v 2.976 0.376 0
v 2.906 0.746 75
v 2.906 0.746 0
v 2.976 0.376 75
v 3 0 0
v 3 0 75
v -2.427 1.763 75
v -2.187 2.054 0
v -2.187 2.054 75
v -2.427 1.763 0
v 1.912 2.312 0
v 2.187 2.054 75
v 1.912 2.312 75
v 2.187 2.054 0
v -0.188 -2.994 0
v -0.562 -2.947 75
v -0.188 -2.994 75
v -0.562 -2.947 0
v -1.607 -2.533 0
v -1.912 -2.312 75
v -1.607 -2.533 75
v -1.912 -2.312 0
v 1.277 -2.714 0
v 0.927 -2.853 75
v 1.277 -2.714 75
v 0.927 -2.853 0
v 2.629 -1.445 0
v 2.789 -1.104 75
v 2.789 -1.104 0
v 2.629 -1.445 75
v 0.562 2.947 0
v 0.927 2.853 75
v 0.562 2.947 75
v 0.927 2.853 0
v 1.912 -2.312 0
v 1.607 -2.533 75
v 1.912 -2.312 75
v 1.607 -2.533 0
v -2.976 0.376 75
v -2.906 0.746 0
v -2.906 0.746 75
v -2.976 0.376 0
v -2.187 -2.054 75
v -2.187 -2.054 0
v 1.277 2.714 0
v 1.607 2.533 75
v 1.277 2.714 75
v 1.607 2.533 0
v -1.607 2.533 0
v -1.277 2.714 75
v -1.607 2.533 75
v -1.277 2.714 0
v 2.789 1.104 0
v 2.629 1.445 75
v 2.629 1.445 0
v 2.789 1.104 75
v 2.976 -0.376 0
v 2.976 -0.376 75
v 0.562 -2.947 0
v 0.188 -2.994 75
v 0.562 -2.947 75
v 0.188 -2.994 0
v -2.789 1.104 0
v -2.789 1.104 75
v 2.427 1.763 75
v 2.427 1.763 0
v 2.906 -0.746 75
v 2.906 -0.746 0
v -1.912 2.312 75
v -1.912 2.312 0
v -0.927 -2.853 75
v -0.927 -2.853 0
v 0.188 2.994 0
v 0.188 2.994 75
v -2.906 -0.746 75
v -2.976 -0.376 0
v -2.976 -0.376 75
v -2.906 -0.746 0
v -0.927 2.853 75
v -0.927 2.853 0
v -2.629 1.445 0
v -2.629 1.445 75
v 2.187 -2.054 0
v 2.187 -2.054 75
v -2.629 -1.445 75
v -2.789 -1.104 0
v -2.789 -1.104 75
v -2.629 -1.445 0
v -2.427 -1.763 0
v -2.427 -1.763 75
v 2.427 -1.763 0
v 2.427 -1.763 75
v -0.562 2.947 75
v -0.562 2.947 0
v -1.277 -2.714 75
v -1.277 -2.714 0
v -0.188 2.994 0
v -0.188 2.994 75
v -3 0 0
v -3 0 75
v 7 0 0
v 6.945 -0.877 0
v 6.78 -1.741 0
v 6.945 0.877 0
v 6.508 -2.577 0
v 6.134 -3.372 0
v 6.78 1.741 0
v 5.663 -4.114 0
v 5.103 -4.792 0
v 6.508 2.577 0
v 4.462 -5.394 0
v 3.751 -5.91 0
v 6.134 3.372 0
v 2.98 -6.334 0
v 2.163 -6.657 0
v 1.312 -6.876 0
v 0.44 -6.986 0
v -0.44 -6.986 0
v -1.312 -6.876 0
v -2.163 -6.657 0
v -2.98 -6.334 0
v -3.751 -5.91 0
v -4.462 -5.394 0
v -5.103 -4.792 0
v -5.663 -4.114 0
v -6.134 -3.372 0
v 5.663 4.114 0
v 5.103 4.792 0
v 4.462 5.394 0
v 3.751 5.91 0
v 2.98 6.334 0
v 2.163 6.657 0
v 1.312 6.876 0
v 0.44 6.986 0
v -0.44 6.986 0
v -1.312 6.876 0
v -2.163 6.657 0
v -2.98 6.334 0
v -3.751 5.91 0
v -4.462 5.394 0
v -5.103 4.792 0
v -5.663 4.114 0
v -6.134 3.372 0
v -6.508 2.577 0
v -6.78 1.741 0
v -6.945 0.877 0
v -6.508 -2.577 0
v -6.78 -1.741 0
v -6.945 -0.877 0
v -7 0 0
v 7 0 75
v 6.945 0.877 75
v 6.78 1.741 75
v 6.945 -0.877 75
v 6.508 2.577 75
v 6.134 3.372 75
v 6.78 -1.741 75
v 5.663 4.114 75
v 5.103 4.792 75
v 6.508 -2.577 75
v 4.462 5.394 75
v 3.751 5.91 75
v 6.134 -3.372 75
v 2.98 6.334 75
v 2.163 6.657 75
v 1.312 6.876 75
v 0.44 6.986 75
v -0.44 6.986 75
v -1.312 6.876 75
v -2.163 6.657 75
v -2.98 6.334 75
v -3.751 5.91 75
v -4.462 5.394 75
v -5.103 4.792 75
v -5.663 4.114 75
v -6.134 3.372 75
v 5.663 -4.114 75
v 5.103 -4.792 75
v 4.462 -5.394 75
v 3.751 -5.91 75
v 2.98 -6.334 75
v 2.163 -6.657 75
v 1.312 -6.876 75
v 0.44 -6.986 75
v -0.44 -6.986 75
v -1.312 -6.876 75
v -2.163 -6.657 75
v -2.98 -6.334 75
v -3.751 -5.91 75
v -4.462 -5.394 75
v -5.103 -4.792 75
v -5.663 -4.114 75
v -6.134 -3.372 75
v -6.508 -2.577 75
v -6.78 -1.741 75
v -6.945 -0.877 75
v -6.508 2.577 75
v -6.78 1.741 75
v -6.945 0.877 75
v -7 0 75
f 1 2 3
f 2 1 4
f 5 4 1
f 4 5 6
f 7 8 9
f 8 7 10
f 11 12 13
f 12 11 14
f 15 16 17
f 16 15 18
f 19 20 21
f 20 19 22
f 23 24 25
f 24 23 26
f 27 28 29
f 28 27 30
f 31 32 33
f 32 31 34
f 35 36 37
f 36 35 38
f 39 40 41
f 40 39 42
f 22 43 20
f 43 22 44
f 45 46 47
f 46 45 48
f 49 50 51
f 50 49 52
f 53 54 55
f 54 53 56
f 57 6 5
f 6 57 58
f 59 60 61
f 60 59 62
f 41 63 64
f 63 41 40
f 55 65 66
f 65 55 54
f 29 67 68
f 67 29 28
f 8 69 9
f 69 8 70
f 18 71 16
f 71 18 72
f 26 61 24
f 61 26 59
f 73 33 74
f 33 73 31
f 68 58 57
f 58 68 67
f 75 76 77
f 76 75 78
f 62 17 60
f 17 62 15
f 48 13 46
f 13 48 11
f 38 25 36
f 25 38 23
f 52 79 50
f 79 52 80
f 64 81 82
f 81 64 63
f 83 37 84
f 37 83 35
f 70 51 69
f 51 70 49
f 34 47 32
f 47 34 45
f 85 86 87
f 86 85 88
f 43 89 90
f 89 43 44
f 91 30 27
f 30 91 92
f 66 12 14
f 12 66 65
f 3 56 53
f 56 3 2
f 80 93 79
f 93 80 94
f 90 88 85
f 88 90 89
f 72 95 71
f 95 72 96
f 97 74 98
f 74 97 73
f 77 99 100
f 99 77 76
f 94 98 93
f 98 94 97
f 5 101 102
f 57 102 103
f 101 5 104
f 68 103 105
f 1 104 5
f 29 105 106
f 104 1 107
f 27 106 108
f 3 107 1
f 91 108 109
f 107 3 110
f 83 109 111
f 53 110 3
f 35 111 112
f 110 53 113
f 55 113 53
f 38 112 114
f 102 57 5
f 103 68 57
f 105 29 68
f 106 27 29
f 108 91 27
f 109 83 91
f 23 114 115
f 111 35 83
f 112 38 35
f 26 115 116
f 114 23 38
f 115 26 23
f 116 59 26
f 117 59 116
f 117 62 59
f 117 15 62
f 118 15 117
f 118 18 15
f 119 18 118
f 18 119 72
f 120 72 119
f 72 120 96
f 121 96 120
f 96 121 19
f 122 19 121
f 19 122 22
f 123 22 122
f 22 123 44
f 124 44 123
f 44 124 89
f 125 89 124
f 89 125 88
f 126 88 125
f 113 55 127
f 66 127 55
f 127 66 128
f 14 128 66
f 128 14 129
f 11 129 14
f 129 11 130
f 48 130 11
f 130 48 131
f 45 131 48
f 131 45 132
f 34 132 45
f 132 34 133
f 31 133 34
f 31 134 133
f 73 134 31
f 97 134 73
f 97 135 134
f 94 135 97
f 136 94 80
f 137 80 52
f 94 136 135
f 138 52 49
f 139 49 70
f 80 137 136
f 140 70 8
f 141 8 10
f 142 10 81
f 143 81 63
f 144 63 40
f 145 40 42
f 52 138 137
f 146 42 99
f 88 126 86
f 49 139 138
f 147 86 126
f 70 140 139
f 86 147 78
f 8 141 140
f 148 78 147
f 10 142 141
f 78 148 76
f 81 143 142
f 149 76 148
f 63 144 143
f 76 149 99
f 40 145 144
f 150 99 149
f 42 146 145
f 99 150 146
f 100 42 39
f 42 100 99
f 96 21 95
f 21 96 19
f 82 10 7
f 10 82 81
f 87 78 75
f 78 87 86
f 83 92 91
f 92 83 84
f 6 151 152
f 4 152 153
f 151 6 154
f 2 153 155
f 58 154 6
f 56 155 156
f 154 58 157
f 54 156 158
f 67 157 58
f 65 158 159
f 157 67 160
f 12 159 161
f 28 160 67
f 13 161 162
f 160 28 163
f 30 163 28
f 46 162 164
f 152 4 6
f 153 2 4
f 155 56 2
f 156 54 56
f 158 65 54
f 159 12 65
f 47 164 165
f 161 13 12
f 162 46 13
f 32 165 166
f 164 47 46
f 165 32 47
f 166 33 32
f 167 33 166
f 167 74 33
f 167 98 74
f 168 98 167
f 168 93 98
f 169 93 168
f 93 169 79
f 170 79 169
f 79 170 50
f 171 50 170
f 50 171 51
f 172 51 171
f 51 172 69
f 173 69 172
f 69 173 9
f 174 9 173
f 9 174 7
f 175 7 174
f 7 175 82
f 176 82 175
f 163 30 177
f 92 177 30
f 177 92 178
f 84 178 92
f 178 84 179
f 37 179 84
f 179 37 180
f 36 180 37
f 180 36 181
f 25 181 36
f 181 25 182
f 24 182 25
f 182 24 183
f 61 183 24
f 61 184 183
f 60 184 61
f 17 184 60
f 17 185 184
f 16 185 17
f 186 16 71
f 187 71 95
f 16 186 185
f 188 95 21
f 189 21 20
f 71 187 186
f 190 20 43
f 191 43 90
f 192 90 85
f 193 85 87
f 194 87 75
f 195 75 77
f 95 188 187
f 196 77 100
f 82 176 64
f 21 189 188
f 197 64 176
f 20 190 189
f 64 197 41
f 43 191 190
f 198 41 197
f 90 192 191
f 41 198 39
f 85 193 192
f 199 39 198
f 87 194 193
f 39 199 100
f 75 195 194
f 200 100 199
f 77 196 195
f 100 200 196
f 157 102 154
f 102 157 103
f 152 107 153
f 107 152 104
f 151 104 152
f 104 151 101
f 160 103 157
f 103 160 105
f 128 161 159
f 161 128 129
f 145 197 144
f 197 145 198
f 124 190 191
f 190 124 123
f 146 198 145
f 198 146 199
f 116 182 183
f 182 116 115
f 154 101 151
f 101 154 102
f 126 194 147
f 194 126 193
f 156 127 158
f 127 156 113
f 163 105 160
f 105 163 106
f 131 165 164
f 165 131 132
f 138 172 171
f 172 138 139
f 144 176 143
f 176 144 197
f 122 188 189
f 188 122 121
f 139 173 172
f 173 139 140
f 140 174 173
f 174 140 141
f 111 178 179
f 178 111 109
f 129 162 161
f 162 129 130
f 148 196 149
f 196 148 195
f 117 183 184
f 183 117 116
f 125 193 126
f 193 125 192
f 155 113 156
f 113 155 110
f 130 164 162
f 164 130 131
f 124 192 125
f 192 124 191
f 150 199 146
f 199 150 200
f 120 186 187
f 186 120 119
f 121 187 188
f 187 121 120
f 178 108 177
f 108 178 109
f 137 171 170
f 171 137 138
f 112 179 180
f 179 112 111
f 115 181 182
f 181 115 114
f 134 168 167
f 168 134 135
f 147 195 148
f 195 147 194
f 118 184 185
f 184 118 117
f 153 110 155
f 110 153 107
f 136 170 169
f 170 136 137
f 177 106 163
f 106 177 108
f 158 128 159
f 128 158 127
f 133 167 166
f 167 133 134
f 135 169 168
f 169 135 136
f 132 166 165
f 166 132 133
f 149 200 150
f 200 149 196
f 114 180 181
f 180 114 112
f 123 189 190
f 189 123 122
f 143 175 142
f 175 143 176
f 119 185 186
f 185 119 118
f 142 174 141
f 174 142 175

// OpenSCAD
$fn = 50;

difference() {
	union() {
		cylinder(h = 75, r = 7.0);
	}
	union() {
		cylinder(h = 75, r = 3.0);
		cylinder(h = 75, r = 1.5);
	}
}
